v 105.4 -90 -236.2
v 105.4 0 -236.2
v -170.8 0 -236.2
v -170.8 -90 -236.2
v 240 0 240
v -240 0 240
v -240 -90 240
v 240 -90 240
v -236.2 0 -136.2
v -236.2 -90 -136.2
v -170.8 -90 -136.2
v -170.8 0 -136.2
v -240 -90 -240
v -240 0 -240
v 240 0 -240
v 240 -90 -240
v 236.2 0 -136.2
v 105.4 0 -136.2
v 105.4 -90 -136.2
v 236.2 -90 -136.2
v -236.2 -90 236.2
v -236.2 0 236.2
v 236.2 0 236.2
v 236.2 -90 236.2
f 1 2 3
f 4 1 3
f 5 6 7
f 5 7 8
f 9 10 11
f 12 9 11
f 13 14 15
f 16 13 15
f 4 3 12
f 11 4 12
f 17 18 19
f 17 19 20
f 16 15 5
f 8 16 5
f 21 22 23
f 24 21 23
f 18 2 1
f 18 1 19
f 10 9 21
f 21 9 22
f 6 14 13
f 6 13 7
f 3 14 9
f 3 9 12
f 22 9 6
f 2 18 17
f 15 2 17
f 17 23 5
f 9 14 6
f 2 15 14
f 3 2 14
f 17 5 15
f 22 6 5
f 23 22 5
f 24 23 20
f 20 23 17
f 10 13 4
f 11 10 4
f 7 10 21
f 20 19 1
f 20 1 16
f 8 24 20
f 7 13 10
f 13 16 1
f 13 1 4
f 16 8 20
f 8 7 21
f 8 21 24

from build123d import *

# Parameters (mm, degrees)
F0_W     = 480
F0_H     = 480
F1_DEPTH = 90
F0_W_2   = 65.4
F0_H_2   = 100
F0_W_3   = 130.8
F2_DEPTH = 90


with BuildPart() as f1:
    # F0 (on Front) → F1 (new body)
    with BuildSketch(Plane.XZ):
        Rectangle(F0_W, F0_H)
        Polygon((-170.8, -236.2), (-236.2, -236.2), (-236.2, -136.2), (-236.2, 236.2), (236.2, 236.2), (236.2, -136.2), (236.2, -236.2), (105.4, -236.2), align=None, mode=Mode.SUBTRACT)
    extrude(amount=F1_DEPTH)

    # F0 (on Front) → F2 (join)
    with BuildSketch(Plane.XZ):
        with Locations((-203.5, -186.2)):
            Rectangle(F0_W_2, F0_H_2)
        with Locations((170.8, -186.2)):
            Rectangle(F0_W_3, F0_H_2)
    extrude(amount=F2_DEPTH)


solid = f1.part
